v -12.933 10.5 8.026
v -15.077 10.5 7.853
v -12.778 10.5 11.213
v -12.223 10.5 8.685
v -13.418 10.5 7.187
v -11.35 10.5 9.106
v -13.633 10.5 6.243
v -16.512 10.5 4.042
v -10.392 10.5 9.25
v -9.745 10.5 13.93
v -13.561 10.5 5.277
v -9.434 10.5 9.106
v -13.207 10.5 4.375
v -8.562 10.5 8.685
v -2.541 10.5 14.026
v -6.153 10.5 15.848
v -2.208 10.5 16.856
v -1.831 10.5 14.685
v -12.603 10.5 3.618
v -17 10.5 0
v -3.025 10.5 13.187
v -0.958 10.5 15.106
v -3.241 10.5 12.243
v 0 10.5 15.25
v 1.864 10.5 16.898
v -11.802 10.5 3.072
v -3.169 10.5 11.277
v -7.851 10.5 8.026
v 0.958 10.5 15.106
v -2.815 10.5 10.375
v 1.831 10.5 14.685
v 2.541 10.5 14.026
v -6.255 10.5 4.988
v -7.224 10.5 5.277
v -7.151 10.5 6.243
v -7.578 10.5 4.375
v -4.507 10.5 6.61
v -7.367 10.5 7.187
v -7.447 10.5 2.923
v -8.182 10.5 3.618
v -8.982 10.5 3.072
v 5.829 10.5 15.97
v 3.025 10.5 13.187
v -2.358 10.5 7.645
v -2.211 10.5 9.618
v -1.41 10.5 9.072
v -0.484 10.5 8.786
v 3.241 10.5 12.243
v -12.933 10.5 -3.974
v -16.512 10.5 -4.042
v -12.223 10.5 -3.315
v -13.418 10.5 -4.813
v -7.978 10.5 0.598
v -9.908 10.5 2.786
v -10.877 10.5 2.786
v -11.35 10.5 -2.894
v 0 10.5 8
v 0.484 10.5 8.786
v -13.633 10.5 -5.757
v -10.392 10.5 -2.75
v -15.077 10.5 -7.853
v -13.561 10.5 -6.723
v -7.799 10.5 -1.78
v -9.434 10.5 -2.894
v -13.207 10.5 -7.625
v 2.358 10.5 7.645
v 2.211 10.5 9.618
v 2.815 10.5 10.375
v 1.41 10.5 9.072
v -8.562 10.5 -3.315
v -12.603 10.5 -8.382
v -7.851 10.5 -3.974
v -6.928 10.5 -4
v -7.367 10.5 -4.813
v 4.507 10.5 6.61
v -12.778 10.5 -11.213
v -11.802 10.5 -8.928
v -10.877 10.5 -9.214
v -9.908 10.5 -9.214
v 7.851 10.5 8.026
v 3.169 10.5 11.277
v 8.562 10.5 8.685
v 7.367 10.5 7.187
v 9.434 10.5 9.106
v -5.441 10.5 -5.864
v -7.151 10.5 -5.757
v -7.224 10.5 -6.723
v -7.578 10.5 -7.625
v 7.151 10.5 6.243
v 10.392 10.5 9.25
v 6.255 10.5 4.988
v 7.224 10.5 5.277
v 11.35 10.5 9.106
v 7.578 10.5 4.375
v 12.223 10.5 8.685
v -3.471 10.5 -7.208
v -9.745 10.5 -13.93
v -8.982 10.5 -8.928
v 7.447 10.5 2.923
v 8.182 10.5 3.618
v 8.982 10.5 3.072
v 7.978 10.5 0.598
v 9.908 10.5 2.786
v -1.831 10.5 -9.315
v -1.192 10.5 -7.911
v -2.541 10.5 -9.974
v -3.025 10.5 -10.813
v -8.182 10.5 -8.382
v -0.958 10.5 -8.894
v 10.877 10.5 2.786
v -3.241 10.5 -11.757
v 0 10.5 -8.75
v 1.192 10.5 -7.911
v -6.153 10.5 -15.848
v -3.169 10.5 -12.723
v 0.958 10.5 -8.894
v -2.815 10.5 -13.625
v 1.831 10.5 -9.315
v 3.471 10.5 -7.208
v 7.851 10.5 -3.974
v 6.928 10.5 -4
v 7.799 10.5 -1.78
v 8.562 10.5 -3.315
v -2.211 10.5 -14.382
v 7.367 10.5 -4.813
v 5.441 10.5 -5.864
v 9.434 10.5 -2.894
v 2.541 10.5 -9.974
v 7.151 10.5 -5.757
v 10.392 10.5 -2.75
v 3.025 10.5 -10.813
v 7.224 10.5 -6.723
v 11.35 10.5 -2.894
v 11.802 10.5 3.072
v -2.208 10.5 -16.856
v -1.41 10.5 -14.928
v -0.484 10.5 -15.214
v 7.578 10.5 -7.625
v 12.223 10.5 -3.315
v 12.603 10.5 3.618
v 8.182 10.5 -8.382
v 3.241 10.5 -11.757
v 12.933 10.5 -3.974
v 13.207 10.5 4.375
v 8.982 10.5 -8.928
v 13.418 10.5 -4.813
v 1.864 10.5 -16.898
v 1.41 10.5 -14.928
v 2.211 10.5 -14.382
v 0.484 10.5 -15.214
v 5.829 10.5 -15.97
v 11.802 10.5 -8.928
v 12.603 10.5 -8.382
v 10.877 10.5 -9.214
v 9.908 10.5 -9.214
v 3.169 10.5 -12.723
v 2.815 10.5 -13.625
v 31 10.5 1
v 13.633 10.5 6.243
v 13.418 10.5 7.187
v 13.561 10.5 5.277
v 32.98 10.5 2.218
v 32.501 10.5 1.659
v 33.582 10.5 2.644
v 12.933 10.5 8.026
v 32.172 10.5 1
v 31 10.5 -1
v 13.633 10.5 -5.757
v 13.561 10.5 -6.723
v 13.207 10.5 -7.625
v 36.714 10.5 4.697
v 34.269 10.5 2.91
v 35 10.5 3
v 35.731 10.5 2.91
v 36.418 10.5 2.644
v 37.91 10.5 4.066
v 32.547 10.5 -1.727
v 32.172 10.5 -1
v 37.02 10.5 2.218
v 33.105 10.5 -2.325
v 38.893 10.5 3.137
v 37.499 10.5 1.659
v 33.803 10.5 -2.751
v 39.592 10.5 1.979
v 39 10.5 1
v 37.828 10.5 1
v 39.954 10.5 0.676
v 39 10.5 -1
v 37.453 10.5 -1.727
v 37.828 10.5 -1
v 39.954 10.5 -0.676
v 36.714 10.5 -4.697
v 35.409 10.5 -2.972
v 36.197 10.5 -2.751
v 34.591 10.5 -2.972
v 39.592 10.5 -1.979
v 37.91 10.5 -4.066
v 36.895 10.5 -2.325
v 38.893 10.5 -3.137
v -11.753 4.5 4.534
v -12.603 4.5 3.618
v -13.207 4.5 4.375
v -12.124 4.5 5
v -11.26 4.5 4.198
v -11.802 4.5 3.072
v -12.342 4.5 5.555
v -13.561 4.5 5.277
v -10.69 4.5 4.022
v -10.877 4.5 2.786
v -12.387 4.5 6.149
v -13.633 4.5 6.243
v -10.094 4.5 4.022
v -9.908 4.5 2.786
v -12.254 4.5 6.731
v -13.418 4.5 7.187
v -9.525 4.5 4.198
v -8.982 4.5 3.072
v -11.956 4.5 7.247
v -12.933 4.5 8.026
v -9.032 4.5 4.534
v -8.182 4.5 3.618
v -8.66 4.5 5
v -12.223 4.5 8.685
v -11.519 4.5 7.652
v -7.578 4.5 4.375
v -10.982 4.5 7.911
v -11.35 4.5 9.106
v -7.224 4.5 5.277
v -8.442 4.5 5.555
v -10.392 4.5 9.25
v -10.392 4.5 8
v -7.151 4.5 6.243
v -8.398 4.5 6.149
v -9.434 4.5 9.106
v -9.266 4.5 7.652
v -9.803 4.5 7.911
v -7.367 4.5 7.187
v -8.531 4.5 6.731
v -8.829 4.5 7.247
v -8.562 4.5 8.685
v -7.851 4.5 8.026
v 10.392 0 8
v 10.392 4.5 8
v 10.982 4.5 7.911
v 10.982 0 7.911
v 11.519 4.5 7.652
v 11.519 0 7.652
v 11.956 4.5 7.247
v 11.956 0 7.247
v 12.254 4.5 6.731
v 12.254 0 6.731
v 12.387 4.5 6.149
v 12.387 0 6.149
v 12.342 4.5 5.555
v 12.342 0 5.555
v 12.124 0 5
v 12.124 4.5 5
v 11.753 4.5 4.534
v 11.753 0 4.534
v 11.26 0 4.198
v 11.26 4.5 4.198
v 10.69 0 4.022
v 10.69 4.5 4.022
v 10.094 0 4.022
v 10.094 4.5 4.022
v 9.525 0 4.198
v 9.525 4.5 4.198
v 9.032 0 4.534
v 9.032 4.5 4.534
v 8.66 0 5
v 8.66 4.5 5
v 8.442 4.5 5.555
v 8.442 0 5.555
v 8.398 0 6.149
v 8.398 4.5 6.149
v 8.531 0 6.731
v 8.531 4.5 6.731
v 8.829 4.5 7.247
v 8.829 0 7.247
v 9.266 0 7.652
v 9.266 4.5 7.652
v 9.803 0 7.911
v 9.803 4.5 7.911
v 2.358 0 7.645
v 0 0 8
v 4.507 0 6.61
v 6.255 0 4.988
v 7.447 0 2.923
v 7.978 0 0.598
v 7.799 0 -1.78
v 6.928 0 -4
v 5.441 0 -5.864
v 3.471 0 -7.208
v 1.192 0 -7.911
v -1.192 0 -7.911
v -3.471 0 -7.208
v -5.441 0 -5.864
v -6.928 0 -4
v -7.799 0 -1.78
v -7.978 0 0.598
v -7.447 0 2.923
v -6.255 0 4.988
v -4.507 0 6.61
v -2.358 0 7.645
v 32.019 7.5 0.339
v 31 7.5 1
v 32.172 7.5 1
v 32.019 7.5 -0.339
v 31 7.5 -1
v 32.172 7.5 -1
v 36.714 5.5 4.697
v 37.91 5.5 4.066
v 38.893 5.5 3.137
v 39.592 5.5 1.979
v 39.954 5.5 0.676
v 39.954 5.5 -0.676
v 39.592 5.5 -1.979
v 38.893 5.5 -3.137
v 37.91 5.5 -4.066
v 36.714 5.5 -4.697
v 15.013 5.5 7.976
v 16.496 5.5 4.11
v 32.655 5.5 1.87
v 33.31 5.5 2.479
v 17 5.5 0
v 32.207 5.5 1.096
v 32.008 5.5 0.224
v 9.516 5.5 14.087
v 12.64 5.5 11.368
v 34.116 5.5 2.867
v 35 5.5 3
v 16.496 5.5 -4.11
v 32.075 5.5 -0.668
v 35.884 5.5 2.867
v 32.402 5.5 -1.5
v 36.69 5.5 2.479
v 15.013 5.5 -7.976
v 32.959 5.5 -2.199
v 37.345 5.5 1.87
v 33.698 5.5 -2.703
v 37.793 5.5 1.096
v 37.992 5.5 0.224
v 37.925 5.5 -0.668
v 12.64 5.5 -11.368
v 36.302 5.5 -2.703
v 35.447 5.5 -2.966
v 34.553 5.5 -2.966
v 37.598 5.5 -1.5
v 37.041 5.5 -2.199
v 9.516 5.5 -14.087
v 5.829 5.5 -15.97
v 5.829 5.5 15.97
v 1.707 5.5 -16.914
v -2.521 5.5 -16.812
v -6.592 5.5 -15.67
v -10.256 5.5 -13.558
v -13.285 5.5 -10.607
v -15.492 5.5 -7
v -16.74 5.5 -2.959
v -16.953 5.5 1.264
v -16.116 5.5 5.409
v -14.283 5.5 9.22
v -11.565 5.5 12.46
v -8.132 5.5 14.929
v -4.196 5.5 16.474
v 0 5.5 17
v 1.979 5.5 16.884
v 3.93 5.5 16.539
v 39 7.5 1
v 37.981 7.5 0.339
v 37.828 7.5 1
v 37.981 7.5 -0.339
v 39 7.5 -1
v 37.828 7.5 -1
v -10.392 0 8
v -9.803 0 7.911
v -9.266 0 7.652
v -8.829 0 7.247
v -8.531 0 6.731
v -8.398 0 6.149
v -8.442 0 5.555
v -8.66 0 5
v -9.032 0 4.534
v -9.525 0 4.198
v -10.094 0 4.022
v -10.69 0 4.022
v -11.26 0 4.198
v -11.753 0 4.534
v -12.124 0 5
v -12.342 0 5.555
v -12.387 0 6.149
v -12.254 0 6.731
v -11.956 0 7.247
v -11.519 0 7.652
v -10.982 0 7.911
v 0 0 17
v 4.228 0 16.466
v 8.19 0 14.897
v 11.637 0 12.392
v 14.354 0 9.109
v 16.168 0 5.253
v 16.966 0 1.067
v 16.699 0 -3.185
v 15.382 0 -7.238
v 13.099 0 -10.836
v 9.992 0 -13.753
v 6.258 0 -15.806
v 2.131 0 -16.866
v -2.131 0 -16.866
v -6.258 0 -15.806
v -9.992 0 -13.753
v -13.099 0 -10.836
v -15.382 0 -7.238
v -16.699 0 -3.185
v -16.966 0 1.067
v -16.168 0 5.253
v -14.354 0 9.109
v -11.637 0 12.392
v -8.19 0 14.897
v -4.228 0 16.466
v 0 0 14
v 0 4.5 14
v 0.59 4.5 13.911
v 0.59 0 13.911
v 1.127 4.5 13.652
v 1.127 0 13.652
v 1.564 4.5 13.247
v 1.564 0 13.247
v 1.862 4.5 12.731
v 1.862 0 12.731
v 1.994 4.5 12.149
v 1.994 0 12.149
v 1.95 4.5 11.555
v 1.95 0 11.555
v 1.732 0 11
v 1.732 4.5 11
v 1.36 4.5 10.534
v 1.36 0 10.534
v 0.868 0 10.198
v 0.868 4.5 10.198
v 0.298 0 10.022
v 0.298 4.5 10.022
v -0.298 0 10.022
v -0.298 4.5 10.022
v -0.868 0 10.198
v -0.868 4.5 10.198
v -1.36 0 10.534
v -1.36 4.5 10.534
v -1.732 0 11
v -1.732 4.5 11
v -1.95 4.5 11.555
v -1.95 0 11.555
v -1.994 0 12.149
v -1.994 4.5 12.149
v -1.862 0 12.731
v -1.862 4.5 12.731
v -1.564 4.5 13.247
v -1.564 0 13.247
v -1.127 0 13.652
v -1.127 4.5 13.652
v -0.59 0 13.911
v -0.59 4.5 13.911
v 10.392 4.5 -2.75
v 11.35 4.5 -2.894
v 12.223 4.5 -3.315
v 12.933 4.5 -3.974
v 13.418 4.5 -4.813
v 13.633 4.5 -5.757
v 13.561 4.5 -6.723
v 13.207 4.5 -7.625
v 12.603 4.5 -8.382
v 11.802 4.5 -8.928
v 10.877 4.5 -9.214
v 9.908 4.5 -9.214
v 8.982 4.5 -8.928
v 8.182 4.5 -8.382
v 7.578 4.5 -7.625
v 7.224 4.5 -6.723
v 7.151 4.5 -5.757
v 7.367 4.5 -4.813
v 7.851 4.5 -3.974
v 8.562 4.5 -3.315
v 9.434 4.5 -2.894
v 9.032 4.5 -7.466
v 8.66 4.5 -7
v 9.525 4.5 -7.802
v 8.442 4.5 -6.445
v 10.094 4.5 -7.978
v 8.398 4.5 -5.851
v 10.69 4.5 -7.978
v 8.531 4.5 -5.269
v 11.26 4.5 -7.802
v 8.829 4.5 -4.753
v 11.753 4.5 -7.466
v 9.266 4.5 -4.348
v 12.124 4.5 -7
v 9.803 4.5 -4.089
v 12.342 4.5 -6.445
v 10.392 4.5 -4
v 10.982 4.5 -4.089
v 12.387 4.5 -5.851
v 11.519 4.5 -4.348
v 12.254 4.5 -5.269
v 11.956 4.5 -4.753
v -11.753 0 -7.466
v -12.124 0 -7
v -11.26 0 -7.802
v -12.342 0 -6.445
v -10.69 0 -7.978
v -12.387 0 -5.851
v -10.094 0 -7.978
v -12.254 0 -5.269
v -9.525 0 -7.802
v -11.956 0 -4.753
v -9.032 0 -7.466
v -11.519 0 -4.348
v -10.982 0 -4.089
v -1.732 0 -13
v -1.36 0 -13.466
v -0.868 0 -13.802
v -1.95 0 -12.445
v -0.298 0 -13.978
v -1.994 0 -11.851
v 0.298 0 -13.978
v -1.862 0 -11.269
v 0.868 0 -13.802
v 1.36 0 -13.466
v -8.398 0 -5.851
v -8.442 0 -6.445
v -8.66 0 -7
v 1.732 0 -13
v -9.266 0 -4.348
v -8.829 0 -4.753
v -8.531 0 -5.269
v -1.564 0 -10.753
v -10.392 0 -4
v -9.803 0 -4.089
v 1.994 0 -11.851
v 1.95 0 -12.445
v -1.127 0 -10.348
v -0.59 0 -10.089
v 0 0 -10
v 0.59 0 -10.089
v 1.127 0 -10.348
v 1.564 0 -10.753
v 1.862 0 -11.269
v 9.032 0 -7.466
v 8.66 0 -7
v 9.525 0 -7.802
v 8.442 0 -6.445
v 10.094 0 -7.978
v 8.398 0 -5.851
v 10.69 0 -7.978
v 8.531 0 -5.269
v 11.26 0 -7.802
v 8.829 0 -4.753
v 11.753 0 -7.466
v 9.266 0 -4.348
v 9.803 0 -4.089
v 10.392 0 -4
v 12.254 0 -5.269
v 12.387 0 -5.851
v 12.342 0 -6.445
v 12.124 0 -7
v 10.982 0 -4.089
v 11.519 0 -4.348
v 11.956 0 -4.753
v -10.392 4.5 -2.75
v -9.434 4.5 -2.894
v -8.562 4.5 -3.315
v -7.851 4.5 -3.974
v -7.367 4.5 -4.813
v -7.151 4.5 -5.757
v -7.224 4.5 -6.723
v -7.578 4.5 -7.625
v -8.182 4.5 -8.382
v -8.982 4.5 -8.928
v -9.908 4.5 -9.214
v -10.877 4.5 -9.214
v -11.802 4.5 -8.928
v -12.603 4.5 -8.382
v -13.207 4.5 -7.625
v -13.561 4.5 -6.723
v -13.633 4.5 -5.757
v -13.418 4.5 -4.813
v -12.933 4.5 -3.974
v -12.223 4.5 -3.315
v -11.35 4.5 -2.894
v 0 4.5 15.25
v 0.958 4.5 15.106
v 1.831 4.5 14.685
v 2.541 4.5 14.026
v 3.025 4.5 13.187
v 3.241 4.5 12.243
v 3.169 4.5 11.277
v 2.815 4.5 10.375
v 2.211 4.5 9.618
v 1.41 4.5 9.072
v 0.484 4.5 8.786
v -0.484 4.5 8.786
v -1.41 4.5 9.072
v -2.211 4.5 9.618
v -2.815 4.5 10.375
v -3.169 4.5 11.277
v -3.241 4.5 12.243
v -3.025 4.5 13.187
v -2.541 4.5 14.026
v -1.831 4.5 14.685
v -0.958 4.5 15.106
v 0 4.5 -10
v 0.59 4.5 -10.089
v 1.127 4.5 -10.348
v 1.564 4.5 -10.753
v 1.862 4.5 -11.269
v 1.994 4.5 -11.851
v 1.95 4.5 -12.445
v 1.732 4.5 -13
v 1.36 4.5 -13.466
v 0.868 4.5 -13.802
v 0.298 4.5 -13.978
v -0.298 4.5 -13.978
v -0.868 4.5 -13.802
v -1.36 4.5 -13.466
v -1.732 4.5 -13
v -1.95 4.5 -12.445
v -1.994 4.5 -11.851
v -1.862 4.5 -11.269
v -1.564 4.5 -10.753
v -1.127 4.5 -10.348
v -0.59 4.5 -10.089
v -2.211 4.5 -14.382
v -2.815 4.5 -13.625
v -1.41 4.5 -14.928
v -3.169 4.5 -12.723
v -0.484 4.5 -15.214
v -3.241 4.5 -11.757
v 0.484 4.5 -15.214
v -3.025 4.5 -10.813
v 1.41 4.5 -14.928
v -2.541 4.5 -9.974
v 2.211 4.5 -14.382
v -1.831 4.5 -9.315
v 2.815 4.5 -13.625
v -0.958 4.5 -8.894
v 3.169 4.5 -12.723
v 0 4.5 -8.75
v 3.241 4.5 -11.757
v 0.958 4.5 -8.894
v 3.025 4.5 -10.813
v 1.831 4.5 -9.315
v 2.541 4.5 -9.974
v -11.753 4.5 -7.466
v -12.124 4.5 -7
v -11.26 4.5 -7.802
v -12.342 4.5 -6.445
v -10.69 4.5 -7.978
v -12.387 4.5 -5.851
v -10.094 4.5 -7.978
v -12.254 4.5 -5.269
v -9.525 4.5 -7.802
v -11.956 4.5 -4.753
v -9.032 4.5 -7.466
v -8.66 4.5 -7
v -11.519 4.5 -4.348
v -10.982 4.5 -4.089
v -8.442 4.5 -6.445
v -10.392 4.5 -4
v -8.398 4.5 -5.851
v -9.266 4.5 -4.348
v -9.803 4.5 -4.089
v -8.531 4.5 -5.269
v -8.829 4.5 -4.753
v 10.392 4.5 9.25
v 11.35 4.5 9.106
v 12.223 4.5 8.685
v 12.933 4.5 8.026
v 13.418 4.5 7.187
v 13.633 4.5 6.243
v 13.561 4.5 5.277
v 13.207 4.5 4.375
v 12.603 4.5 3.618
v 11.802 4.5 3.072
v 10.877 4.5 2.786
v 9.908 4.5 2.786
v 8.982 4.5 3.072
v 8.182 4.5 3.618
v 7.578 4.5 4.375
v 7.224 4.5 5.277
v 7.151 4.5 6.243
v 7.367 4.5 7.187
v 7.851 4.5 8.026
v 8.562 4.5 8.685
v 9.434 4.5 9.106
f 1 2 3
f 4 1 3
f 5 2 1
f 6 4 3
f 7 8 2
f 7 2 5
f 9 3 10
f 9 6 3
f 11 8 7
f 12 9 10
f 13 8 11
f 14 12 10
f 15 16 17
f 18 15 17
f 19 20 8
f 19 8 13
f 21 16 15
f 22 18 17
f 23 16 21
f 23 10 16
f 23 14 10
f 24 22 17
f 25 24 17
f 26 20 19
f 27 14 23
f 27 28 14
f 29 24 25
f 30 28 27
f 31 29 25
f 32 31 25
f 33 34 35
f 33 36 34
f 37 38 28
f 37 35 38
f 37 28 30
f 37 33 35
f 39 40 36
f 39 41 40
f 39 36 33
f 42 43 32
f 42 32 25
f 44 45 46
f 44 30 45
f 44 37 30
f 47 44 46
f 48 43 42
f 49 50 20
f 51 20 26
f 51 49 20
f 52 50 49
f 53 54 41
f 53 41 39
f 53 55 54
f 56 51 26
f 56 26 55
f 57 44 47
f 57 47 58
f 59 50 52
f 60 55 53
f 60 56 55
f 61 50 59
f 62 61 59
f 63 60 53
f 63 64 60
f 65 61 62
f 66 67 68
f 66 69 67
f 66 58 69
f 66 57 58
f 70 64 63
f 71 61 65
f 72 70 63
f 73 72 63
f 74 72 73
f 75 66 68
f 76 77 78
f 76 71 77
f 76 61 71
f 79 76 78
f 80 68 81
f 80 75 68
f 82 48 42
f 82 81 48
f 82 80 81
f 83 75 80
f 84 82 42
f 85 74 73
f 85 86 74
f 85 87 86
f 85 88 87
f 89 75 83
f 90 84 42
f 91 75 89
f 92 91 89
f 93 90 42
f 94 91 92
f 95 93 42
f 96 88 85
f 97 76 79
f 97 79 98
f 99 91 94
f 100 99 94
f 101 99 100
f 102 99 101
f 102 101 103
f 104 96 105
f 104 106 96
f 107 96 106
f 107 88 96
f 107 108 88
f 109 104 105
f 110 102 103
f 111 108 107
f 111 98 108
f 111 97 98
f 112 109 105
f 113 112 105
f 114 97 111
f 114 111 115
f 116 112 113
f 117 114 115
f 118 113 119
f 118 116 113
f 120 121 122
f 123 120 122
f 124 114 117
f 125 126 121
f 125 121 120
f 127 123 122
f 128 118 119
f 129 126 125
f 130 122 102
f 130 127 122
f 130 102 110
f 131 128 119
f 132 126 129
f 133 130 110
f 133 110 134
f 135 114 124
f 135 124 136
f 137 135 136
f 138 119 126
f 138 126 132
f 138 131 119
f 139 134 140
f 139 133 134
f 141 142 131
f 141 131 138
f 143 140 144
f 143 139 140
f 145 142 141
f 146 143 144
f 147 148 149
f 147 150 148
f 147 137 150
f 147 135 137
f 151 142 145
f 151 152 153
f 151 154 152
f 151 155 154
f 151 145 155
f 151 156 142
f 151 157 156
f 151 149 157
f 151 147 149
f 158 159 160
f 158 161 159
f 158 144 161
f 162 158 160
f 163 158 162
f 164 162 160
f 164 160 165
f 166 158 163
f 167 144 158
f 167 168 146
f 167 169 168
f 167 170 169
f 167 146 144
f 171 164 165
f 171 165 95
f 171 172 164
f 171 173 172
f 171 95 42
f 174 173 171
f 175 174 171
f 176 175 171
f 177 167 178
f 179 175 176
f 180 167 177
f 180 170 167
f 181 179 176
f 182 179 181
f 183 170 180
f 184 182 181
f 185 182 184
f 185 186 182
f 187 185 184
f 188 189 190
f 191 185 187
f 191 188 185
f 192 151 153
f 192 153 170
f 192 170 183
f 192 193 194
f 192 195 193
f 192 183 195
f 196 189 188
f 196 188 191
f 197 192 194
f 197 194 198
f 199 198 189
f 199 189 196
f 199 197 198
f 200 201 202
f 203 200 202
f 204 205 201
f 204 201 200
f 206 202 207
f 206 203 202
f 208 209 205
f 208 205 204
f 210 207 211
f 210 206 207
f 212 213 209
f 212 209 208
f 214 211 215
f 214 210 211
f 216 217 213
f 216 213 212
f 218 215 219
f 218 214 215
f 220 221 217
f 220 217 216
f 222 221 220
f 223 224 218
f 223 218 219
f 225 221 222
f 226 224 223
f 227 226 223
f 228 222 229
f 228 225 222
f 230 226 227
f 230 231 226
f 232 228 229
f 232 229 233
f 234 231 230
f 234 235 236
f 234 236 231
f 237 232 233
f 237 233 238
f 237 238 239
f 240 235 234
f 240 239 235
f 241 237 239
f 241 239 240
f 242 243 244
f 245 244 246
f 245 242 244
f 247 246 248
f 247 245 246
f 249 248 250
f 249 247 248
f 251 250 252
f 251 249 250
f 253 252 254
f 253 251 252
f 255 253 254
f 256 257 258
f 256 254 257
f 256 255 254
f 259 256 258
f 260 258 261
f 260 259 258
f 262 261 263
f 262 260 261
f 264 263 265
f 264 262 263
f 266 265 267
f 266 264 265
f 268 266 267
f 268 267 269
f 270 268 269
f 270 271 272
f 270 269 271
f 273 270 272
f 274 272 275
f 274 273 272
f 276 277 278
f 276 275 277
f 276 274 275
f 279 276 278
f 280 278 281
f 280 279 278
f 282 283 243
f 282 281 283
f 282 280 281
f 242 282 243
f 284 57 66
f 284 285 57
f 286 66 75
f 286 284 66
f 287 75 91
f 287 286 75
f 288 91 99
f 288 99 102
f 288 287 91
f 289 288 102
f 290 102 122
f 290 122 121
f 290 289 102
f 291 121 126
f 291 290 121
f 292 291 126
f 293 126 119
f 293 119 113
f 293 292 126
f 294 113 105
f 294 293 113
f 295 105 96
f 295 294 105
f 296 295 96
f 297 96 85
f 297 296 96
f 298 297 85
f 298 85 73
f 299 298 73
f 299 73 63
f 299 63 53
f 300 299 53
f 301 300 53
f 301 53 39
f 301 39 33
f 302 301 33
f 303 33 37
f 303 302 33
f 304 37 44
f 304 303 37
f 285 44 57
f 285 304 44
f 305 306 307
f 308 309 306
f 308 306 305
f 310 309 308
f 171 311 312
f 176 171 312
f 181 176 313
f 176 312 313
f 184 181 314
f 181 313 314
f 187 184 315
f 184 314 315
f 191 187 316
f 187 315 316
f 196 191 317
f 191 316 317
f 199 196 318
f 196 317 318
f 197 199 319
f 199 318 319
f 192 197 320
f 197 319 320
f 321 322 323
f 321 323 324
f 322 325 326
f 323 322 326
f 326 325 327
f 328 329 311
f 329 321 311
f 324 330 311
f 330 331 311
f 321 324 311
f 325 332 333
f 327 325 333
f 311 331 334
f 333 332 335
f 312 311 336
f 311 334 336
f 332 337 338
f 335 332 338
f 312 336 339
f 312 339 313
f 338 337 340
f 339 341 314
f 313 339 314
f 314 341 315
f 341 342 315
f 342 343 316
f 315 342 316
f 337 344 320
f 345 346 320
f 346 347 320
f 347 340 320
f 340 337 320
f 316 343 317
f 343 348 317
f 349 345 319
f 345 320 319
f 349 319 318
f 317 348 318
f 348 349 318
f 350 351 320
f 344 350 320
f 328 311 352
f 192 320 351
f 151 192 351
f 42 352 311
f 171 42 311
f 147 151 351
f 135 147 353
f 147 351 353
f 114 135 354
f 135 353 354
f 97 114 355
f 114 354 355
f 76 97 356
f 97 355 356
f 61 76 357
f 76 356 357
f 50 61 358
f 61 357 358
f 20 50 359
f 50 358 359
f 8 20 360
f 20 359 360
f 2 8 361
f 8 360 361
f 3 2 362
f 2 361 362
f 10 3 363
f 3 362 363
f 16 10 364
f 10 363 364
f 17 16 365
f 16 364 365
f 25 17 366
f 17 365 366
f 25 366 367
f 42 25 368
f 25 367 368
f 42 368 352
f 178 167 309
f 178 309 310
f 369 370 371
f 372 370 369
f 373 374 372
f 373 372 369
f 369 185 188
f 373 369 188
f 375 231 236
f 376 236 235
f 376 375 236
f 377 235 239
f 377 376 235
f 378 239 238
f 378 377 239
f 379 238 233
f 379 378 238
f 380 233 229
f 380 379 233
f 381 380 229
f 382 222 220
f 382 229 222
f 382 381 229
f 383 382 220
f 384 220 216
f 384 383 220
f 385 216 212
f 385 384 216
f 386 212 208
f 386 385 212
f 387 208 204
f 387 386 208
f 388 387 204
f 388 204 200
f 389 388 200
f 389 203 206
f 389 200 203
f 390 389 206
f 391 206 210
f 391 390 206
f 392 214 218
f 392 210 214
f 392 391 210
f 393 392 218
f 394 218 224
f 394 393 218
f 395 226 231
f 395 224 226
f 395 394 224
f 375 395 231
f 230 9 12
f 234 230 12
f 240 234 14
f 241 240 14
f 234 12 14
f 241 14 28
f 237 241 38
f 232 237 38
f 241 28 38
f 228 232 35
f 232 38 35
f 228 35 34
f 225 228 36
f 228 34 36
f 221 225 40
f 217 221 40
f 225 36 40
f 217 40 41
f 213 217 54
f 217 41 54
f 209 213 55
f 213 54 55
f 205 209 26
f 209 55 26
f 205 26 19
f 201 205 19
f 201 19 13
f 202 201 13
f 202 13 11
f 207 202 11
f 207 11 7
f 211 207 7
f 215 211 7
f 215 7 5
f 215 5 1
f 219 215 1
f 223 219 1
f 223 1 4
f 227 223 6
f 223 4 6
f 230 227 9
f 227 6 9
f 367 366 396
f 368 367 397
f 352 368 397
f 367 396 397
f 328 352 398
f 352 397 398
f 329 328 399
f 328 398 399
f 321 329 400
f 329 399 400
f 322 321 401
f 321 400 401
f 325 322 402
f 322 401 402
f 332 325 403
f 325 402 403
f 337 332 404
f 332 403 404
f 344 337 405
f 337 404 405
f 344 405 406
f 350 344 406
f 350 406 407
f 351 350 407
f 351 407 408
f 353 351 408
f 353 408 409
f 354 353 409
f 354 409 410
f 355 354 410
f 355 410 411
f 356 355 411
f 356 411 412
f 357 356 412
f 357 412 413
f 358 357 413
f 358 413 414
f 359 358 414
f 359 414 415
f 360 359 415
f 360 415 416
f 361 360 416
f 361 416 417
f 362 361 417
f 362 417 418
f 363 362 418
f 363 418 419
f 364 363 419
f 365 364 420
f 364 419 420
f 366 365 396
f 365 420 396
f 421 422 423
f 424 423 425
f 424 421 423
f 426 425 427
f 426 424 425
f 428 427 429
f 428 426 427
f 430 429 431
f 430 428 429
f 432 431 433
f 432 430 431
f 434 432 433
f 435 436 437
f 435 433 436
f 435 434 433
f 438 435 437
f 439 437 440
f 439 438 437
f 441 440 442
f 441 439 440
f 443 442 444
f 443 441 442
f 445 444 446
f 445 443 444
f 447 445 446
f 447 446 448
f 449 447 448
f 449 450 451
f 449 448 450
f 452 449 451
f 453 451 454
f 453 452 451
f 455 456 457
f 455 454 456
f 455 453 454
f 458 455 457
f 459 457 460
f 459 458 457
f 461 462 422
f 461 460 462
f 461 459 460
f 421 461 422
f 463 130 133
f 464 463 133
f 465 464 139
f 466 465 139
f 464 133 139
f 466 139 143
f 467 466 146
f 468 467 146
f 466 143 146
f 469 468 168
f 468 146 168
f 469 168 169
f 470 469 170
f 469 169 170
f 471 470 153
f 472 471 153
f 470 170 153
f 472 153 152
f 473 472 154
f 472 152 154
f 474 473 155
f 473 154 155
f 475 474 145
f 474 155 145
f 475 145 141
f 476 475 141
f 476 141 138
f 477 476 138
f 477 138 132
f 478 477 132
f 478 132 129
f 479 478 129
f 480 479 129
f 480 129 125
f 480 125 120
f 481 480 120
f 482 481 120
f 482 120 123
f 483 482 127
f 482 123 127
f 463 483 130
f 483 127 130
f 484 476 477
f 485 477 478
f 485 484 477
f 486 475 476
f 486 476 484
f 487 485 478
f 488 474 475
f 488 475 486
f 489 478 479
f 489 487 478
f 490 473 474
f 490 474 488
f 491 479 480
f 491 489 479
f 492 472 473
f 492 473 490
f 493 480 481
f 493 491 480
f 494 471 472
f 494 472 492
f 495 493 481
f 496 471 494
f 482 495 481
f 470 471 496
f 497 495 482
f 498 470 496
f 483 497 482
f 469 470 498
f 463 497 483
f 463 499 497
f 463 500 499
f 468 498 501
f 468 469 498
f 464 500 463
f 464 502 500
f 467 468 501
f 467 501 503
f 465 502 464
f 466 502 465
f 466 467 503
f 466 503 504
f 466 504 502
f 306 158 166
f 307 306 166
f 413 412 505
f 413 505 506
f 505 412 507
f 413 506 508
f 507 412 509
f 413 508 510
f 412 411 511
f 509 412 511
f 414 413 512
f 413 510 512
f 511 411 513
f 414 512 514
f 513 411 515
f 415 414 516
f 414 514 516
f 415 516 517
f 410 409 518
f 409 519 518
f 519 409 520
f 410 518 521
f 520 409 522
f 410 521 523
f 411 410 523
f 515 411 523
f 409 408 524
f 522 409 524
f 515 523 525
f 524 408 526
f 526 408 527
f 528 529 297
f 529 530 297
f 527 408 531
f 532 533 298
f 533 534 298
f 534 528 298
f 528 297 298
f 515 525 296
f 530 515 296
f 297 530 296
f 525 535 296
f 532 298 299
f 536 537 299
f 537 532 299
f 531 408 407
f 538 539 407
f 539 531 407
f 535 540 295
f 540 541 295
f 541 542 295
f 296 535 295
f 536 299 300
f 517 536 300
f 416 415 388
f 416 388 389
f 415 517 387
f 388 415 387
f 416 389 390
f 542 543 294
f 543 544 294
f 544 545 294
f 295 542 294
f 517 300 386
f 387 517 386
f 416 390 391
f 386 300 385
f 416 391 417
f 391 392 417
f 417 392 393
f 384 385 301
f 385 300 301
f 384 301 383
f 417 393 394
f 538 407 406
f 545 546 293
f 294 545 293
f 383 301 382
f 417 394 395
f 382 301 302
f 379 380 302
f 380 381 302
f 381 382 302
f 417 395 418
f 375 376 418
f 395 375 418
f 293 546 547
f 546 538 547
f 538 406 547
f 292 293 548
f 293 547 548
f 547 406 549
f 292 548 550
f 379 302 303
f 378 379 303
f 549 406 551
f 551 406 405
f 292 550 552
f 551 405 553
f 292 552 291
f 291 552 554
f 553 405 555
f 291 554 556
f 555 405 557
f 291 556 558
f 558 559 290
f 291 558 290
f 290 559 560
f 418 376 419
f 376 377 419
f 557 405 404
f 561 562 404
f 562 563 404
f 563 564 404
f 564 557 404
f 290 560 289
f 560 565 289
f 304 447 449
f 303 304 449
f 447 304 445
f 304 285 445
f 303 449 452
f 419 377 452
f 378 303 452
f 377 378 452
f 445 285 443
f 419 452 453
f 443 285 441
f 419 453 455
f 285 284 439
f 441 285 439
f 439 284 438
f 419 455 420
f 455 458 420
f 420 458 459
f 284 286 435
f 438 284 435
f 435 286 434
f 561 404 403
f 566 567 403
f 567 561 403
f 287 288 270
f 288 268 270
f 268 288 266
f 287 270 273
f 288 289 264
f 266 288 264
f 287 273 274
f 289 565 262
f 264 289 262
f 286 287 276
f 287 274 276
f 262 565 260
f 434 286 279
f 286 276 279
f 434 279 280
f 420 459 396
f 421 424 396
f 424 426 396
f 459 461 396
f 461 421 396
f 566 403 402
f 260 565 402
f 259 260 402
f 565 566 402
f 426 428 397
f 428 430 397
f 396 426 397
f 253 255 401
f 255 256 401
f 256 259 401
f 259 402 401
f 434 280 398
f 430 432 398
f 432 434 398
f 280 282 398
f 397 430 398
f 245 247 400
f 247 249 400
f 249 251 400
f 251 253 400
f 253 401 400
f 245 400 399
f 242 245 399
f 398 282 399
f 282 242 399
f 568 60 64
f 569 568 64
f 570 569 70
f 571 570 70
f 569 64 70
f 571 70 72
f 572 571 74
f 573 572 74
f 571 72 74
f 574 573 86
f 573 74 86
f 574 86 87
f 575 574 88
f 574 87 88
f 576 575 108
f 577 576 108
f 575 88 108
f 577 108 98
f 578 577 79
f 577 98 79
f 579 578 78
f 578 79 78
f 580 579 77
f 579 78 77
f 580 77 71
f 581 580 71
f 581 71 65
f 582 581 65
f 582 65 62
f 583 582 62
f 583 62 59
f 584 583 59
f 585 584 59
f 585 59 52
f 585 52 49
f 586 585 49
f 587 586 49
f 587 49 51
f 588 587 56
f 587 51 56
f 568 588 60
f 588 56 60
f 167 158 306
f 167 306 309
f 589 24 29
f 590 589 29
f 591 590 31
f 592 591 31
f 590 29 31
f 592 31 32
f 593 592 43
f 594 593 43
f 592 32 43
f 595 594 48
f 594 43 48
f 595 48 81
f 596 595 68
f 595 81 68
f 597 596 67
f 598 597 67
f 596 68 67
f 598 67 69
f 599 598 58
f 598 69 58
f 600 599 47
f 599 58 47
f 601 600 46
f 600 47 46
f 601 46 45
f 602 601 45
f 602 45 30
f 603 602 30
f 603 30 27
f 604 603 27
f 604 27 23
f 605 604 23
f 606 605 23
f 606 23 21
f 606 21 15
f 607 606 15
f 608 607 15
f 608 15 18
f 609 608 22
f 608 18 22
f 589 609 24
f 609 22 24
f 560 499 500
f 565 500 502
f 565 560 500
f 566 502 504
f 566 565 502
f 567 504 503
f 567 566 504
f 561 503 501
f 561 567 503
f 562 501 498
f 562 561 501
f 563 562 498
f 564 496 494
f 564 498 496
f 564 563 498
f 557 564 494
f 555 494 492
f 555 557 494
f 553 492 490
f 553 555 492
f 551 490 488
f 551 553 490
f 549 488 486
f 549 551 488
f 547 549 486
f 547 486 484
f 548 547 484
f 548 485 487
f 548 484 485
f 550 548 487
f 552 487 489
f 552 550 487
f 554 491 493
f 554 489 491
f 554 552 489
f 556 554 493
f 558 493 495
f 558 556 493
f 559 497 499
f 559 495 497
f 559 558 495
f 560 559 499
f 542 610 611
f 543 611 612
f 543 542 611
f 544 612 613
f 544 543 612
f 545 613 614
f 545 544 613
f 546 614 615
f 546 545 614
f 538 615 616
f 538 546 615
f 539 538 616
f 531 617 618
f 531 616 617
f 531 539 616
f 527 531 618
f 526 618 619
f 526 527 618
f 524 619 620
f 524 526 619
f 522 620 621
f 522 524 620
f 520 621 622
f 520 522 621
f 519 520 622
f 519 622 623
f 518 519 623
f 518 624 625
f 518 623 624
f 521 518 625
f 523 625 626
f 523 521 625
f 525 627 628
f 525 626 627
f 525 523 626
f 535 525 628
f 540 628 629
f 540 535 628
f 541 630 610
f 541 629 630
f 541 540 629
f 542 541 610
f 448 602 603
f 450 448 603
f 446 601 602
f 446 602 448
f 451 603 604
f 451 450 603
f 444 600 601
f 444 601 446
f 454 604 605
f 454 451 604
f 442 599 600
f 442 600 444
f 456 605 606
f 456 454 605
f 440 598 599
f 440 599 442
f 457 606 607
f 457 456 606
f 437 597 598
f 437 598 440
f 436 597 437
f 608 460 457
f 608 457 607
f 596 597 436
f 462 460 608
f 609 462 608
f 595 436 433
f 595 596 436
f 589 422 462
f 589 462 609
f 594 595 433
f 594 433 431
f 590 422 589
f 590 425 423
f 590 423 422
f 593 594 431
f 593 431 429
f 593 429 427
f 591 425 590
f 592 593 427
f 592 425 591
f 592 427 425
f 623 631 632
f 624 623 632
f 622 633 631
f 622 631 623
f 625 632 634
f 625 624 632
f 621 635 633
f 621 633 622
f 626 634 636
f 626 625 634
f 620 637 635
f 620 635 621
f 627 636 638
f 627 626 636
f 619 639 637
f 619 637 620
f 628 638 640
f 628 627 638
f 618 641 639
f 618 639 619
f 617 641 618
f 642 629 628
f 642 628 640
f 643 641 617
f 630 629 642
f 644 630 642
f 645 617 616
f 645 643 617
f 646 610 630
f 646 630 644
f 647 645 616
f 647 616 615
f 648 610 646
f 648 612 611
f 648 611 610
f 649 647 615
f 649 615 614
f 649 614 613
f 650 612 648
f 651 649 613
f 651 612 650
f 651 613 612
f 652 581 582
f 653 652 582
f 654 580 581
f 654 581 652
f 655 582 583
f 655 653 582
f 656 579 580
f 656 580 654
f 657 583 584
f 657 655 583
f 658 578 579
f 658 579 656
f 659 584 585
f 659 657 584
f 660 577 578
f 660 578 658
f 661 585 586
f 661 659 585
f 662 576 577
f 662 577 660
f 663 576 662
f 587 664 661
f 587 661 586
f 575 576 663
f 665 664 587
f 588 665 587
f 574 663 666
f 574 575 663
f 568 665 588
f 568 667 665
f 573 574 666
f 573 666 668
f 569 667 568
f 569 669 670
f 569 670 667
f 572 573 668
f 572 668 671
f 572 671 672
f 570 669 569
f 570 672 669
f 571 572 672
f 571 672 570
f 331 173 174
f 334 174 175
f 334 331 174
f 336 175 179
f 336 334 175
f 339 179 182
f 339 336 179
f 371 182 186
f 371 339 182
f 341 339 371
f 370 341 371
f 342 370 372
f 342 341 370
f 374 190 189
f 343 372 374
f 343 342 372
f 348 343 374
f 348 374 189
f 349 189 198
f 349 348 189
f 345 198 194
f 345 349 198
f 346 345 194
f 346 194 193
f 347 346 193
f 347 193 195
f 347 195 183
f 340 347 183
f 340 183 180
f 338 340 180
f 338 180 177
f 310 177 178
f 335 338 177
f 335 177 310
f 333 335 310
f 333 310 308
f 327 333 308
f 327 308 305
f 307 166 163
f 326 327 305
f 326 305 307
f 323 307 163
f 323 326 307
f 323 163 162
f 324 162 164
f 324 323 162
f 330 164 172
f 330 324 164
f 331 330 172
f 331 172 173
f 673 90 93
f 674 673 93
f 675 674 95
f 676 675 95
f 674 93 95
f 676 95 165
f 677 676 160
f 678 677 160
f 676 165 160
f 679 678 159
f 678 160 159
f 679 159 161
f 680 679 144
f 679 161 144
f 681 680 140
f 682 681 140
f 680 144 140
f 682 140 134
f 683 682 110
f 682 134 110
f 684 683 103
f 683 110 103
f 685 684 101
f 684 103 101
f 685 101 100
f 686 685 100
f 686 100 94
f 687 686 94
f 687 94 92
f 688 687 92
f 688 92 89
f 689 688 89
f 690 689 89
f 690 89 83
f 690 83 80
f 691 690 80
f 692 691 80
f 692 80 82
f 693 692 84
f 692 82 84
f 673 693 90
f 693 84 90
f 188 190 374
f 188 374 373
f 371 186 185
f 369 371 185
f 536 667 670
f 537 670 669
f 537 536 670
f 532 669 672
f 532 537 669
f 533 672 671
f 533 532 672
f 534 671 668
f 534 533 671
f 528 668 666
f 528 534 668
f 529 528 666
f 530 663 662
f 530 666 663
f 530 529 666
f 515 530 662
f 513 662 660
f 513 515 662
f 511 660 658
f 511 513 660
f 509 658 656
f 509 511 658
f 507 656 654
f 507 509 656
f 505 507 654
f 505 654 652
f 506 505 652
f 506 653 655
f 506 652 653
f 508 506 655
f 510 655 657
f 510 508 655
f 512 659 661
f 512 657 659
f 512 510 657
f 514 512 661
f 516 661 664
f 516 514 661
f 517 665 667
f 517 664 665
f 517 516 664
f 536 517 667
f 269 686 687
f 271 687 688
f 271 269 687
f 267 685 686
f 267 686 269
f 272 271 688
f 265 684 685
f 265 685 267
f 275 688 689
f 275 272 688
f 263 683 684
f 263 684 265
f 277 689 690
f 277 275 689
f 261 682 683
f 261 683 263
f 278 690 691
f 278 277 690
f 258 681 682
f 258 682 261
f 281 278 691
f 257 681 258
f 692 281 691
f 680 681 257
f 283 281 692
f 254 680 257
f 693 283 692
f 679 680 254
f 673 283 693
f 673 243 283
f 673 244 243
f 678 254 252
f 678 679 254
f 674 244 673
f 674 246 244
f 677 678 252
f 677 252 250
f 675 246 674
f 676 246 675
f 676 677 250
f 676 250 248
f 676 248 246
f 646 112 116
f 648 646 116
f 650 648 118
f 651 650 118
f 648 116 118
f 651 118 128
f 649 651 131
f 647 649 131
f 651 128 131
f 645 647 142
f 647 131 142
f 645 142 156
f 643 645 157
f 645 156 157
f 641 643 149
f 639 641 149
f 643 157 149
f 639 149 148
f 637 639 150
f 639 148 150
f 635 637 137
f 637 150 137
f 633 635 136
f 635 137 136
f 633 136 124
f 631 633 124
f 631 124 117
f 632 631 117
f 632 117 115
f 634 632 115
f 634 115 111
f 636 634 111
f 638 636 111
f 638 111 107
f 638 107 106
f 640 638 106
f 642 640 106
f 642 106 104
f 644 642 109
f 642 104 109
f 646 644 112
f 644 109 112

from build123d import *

# Parameters (mm, degrees)
SKETCH_1_R          = 17
SKETCH_1_R_2        = 2
SKETCH_1_R_3        = 8
EXTRUDE_1_DEPTH     = 5.5
EXTRUDE_START       = 5.5
SKETCH_1_3_R        = 2
SKETCH_1_3_R_2      = 3
SKETCH_1_3_R_3      = 8
EXTRUDE_2_DEPTH     = 5
SKETCH_2_R          = 3.25
CUT_EXTRUDE_4_DEPTH = 6
SKETCH_3_W          = 8
SKETCH_3_H          = 2
CUT_EXTRUDE_5_DEPTH = 3


with BuildPart() as part:
    # 스케치1 → 보스-돌출1 (new body)
    with BuildSketch(Plane(origin=(0, 0, 0), x_dir=(1, 0, 0), z_dir=(0, 1, 0))):
        with Locations(Location((0, 0, 0), (0, 0, 270))):
            Circle(SKETCH_1_R)
        with Locations(Location((0, 12, 0), (0, 0, 270))):
            Circle(SKETCH_1_R_2, mode=Mode.SUBTRACT)
        with Locations(Location((10.392304845, 6, 0), (0, 0, 270))):
            Circle(SKETCH_1_R_2, mode=Mode.SUBTRACT)
        with Locations(Location((10.392304845, -6, 0), (0, 0, 270))):
            Circle(SKETCH_1_R_2, mode=Mode.SUBTRACT)
        with Locations(Location((0, -12, 0), (0, 0, 270))):
            Circle(SKETCH_1_R_2, mode=Mode.SUBTRACT)
        with Locations(Location((-10.392304845, -6, 0), (0, 0, 270))):
            Circle(SKETCH_1_R_2, mode=Mode.SUBTRACT)
        with Locations(Location((-10.392304845, 6, 0), (0, 0, 270))):
            Circle(SKETCH_1_R_2, mode=Mode.SUBTRACT)
        with Locations(Location((0, 0, 0), (0, 0, 270))):
            Circle(SKETCH_1_R_3, mode=Mode.SUBTRACT)
    extrude(amount=EXTRUDE_1_DEPTH)

    # 스케치1<3> → 보스-돌출2 (add)
    with BuildSketch(Plane(origin=(0, 0, 0), x_dir=(1, 0, 0), z_dir=(0, 1, 0)).offset(EXTRUDE_START)):
        with BuildLine():
            Line((36.714285714, 4.696937778), (5.828571429, 15.969588445))
            ThreePointArc((5.828571429, 15.969588445), (-17, 0), (5.828571429, -15.969588445))
            Line((5.828571429, -15.969588445), (36.714285714, -4.696937778))
            ThreePointArc((36.714285714, -4.696937778), (40, 0), (36.714285714, 4.696937778))
        make_face()
        with Locations(Location((10.392304845, -6, 0), (0, 0, 270))):
            Circle(SKETCH_1_3_R, mode=Mode.SUBTRACT)
        with Locations(Location((0, -12, 0), (0, 0, 270))):
            Circle(SKETCH_1_3_R, mode=Mode.SUBTRACT)
        with Locations(Location((-10.392304845, -6, 0), (0, 0, 270))):
            Circle(SKETCH_1_3_R, mode=Mode.SUBTRACT)
        with Locations(Location((-10.392304845, 6, 0), (0, 0, 270))):
            Circle(SKETCH_1_3_R, mode=Mode.SUBTRACT)
        with Locations(Location((0, 12, 0), (0, 0, 270))):
            Circle(SKETCH_1_3_R, mode=Mode.SUBTRACT)
        with Locations(Location((10.392304845, 6, 0), (0, 0, 270))):
            Circle(SKETCH_1_3_R, mode=Mode.SUBTRACT)
        with Locations(Location((35, 0, 0), (0, 0, 270))):
            Circle(SKETCH_1_3_R_2, mode=Mode.SUBTRACT)
        with Locations(Location((0, 0, 0), (0, 0, 270))):
            Circle(SKETCH_1_3_R_3, mode=Mode.SUBTRACT)
    extrude(amount=EXTRUDE_2_DEPTH)

    # 스케치2 → 컷-돌출4 (cut)
    with BuildSketch(Plane(origin=(0, 10.5, 0), x_dir=(1, 0, 0), z_dir=(0, 1, 0))):
        with Locations(Location((0, 12, 0), (0, 0, 270))):
            Circle(SKETCH_2_R)
        with Locations(Location((10.392304845, 6, 0), (0, 0, 270))):
            Circle(SKETCH_2_R)
        with Locations(Location((10.392304845, -6, 0), (0, 0, 270))):
            Circle(SKETCH_2_R)
        with Locations(Location((0, -12, 0), (0, 0, 270))):
            Circle(SKETCH_2_R)
        with Locations(Location((-10.392304845, -6, 0), (0, 0, 270))):
            Circle(SKETCH_2_R)
        with Locations(Location((-10.392304845, 6, 0), (0, 0, 270))):
            Circle(SKETCH_2_R)
    extrude(amount=-CUT_EXTRUDE_4_DEPTH, mode=Mode.SUBTRACT)

    # 스케치3 → 컷-돌출5 (cut)
    with BuildSketch(Plane(origin=(0, 10.5, 0), x_dir=(1, 0, 0), z_dir=(0, 1, 0))):
        with Locations((35, 0)):
            Rectangle(SKETCH_3_W, SKETCH_3_H)
    extrude(amount=-CUT_EXTRUDE_5_DEPTH, mode=Mode.SUBTRACT)


solid = part.part
